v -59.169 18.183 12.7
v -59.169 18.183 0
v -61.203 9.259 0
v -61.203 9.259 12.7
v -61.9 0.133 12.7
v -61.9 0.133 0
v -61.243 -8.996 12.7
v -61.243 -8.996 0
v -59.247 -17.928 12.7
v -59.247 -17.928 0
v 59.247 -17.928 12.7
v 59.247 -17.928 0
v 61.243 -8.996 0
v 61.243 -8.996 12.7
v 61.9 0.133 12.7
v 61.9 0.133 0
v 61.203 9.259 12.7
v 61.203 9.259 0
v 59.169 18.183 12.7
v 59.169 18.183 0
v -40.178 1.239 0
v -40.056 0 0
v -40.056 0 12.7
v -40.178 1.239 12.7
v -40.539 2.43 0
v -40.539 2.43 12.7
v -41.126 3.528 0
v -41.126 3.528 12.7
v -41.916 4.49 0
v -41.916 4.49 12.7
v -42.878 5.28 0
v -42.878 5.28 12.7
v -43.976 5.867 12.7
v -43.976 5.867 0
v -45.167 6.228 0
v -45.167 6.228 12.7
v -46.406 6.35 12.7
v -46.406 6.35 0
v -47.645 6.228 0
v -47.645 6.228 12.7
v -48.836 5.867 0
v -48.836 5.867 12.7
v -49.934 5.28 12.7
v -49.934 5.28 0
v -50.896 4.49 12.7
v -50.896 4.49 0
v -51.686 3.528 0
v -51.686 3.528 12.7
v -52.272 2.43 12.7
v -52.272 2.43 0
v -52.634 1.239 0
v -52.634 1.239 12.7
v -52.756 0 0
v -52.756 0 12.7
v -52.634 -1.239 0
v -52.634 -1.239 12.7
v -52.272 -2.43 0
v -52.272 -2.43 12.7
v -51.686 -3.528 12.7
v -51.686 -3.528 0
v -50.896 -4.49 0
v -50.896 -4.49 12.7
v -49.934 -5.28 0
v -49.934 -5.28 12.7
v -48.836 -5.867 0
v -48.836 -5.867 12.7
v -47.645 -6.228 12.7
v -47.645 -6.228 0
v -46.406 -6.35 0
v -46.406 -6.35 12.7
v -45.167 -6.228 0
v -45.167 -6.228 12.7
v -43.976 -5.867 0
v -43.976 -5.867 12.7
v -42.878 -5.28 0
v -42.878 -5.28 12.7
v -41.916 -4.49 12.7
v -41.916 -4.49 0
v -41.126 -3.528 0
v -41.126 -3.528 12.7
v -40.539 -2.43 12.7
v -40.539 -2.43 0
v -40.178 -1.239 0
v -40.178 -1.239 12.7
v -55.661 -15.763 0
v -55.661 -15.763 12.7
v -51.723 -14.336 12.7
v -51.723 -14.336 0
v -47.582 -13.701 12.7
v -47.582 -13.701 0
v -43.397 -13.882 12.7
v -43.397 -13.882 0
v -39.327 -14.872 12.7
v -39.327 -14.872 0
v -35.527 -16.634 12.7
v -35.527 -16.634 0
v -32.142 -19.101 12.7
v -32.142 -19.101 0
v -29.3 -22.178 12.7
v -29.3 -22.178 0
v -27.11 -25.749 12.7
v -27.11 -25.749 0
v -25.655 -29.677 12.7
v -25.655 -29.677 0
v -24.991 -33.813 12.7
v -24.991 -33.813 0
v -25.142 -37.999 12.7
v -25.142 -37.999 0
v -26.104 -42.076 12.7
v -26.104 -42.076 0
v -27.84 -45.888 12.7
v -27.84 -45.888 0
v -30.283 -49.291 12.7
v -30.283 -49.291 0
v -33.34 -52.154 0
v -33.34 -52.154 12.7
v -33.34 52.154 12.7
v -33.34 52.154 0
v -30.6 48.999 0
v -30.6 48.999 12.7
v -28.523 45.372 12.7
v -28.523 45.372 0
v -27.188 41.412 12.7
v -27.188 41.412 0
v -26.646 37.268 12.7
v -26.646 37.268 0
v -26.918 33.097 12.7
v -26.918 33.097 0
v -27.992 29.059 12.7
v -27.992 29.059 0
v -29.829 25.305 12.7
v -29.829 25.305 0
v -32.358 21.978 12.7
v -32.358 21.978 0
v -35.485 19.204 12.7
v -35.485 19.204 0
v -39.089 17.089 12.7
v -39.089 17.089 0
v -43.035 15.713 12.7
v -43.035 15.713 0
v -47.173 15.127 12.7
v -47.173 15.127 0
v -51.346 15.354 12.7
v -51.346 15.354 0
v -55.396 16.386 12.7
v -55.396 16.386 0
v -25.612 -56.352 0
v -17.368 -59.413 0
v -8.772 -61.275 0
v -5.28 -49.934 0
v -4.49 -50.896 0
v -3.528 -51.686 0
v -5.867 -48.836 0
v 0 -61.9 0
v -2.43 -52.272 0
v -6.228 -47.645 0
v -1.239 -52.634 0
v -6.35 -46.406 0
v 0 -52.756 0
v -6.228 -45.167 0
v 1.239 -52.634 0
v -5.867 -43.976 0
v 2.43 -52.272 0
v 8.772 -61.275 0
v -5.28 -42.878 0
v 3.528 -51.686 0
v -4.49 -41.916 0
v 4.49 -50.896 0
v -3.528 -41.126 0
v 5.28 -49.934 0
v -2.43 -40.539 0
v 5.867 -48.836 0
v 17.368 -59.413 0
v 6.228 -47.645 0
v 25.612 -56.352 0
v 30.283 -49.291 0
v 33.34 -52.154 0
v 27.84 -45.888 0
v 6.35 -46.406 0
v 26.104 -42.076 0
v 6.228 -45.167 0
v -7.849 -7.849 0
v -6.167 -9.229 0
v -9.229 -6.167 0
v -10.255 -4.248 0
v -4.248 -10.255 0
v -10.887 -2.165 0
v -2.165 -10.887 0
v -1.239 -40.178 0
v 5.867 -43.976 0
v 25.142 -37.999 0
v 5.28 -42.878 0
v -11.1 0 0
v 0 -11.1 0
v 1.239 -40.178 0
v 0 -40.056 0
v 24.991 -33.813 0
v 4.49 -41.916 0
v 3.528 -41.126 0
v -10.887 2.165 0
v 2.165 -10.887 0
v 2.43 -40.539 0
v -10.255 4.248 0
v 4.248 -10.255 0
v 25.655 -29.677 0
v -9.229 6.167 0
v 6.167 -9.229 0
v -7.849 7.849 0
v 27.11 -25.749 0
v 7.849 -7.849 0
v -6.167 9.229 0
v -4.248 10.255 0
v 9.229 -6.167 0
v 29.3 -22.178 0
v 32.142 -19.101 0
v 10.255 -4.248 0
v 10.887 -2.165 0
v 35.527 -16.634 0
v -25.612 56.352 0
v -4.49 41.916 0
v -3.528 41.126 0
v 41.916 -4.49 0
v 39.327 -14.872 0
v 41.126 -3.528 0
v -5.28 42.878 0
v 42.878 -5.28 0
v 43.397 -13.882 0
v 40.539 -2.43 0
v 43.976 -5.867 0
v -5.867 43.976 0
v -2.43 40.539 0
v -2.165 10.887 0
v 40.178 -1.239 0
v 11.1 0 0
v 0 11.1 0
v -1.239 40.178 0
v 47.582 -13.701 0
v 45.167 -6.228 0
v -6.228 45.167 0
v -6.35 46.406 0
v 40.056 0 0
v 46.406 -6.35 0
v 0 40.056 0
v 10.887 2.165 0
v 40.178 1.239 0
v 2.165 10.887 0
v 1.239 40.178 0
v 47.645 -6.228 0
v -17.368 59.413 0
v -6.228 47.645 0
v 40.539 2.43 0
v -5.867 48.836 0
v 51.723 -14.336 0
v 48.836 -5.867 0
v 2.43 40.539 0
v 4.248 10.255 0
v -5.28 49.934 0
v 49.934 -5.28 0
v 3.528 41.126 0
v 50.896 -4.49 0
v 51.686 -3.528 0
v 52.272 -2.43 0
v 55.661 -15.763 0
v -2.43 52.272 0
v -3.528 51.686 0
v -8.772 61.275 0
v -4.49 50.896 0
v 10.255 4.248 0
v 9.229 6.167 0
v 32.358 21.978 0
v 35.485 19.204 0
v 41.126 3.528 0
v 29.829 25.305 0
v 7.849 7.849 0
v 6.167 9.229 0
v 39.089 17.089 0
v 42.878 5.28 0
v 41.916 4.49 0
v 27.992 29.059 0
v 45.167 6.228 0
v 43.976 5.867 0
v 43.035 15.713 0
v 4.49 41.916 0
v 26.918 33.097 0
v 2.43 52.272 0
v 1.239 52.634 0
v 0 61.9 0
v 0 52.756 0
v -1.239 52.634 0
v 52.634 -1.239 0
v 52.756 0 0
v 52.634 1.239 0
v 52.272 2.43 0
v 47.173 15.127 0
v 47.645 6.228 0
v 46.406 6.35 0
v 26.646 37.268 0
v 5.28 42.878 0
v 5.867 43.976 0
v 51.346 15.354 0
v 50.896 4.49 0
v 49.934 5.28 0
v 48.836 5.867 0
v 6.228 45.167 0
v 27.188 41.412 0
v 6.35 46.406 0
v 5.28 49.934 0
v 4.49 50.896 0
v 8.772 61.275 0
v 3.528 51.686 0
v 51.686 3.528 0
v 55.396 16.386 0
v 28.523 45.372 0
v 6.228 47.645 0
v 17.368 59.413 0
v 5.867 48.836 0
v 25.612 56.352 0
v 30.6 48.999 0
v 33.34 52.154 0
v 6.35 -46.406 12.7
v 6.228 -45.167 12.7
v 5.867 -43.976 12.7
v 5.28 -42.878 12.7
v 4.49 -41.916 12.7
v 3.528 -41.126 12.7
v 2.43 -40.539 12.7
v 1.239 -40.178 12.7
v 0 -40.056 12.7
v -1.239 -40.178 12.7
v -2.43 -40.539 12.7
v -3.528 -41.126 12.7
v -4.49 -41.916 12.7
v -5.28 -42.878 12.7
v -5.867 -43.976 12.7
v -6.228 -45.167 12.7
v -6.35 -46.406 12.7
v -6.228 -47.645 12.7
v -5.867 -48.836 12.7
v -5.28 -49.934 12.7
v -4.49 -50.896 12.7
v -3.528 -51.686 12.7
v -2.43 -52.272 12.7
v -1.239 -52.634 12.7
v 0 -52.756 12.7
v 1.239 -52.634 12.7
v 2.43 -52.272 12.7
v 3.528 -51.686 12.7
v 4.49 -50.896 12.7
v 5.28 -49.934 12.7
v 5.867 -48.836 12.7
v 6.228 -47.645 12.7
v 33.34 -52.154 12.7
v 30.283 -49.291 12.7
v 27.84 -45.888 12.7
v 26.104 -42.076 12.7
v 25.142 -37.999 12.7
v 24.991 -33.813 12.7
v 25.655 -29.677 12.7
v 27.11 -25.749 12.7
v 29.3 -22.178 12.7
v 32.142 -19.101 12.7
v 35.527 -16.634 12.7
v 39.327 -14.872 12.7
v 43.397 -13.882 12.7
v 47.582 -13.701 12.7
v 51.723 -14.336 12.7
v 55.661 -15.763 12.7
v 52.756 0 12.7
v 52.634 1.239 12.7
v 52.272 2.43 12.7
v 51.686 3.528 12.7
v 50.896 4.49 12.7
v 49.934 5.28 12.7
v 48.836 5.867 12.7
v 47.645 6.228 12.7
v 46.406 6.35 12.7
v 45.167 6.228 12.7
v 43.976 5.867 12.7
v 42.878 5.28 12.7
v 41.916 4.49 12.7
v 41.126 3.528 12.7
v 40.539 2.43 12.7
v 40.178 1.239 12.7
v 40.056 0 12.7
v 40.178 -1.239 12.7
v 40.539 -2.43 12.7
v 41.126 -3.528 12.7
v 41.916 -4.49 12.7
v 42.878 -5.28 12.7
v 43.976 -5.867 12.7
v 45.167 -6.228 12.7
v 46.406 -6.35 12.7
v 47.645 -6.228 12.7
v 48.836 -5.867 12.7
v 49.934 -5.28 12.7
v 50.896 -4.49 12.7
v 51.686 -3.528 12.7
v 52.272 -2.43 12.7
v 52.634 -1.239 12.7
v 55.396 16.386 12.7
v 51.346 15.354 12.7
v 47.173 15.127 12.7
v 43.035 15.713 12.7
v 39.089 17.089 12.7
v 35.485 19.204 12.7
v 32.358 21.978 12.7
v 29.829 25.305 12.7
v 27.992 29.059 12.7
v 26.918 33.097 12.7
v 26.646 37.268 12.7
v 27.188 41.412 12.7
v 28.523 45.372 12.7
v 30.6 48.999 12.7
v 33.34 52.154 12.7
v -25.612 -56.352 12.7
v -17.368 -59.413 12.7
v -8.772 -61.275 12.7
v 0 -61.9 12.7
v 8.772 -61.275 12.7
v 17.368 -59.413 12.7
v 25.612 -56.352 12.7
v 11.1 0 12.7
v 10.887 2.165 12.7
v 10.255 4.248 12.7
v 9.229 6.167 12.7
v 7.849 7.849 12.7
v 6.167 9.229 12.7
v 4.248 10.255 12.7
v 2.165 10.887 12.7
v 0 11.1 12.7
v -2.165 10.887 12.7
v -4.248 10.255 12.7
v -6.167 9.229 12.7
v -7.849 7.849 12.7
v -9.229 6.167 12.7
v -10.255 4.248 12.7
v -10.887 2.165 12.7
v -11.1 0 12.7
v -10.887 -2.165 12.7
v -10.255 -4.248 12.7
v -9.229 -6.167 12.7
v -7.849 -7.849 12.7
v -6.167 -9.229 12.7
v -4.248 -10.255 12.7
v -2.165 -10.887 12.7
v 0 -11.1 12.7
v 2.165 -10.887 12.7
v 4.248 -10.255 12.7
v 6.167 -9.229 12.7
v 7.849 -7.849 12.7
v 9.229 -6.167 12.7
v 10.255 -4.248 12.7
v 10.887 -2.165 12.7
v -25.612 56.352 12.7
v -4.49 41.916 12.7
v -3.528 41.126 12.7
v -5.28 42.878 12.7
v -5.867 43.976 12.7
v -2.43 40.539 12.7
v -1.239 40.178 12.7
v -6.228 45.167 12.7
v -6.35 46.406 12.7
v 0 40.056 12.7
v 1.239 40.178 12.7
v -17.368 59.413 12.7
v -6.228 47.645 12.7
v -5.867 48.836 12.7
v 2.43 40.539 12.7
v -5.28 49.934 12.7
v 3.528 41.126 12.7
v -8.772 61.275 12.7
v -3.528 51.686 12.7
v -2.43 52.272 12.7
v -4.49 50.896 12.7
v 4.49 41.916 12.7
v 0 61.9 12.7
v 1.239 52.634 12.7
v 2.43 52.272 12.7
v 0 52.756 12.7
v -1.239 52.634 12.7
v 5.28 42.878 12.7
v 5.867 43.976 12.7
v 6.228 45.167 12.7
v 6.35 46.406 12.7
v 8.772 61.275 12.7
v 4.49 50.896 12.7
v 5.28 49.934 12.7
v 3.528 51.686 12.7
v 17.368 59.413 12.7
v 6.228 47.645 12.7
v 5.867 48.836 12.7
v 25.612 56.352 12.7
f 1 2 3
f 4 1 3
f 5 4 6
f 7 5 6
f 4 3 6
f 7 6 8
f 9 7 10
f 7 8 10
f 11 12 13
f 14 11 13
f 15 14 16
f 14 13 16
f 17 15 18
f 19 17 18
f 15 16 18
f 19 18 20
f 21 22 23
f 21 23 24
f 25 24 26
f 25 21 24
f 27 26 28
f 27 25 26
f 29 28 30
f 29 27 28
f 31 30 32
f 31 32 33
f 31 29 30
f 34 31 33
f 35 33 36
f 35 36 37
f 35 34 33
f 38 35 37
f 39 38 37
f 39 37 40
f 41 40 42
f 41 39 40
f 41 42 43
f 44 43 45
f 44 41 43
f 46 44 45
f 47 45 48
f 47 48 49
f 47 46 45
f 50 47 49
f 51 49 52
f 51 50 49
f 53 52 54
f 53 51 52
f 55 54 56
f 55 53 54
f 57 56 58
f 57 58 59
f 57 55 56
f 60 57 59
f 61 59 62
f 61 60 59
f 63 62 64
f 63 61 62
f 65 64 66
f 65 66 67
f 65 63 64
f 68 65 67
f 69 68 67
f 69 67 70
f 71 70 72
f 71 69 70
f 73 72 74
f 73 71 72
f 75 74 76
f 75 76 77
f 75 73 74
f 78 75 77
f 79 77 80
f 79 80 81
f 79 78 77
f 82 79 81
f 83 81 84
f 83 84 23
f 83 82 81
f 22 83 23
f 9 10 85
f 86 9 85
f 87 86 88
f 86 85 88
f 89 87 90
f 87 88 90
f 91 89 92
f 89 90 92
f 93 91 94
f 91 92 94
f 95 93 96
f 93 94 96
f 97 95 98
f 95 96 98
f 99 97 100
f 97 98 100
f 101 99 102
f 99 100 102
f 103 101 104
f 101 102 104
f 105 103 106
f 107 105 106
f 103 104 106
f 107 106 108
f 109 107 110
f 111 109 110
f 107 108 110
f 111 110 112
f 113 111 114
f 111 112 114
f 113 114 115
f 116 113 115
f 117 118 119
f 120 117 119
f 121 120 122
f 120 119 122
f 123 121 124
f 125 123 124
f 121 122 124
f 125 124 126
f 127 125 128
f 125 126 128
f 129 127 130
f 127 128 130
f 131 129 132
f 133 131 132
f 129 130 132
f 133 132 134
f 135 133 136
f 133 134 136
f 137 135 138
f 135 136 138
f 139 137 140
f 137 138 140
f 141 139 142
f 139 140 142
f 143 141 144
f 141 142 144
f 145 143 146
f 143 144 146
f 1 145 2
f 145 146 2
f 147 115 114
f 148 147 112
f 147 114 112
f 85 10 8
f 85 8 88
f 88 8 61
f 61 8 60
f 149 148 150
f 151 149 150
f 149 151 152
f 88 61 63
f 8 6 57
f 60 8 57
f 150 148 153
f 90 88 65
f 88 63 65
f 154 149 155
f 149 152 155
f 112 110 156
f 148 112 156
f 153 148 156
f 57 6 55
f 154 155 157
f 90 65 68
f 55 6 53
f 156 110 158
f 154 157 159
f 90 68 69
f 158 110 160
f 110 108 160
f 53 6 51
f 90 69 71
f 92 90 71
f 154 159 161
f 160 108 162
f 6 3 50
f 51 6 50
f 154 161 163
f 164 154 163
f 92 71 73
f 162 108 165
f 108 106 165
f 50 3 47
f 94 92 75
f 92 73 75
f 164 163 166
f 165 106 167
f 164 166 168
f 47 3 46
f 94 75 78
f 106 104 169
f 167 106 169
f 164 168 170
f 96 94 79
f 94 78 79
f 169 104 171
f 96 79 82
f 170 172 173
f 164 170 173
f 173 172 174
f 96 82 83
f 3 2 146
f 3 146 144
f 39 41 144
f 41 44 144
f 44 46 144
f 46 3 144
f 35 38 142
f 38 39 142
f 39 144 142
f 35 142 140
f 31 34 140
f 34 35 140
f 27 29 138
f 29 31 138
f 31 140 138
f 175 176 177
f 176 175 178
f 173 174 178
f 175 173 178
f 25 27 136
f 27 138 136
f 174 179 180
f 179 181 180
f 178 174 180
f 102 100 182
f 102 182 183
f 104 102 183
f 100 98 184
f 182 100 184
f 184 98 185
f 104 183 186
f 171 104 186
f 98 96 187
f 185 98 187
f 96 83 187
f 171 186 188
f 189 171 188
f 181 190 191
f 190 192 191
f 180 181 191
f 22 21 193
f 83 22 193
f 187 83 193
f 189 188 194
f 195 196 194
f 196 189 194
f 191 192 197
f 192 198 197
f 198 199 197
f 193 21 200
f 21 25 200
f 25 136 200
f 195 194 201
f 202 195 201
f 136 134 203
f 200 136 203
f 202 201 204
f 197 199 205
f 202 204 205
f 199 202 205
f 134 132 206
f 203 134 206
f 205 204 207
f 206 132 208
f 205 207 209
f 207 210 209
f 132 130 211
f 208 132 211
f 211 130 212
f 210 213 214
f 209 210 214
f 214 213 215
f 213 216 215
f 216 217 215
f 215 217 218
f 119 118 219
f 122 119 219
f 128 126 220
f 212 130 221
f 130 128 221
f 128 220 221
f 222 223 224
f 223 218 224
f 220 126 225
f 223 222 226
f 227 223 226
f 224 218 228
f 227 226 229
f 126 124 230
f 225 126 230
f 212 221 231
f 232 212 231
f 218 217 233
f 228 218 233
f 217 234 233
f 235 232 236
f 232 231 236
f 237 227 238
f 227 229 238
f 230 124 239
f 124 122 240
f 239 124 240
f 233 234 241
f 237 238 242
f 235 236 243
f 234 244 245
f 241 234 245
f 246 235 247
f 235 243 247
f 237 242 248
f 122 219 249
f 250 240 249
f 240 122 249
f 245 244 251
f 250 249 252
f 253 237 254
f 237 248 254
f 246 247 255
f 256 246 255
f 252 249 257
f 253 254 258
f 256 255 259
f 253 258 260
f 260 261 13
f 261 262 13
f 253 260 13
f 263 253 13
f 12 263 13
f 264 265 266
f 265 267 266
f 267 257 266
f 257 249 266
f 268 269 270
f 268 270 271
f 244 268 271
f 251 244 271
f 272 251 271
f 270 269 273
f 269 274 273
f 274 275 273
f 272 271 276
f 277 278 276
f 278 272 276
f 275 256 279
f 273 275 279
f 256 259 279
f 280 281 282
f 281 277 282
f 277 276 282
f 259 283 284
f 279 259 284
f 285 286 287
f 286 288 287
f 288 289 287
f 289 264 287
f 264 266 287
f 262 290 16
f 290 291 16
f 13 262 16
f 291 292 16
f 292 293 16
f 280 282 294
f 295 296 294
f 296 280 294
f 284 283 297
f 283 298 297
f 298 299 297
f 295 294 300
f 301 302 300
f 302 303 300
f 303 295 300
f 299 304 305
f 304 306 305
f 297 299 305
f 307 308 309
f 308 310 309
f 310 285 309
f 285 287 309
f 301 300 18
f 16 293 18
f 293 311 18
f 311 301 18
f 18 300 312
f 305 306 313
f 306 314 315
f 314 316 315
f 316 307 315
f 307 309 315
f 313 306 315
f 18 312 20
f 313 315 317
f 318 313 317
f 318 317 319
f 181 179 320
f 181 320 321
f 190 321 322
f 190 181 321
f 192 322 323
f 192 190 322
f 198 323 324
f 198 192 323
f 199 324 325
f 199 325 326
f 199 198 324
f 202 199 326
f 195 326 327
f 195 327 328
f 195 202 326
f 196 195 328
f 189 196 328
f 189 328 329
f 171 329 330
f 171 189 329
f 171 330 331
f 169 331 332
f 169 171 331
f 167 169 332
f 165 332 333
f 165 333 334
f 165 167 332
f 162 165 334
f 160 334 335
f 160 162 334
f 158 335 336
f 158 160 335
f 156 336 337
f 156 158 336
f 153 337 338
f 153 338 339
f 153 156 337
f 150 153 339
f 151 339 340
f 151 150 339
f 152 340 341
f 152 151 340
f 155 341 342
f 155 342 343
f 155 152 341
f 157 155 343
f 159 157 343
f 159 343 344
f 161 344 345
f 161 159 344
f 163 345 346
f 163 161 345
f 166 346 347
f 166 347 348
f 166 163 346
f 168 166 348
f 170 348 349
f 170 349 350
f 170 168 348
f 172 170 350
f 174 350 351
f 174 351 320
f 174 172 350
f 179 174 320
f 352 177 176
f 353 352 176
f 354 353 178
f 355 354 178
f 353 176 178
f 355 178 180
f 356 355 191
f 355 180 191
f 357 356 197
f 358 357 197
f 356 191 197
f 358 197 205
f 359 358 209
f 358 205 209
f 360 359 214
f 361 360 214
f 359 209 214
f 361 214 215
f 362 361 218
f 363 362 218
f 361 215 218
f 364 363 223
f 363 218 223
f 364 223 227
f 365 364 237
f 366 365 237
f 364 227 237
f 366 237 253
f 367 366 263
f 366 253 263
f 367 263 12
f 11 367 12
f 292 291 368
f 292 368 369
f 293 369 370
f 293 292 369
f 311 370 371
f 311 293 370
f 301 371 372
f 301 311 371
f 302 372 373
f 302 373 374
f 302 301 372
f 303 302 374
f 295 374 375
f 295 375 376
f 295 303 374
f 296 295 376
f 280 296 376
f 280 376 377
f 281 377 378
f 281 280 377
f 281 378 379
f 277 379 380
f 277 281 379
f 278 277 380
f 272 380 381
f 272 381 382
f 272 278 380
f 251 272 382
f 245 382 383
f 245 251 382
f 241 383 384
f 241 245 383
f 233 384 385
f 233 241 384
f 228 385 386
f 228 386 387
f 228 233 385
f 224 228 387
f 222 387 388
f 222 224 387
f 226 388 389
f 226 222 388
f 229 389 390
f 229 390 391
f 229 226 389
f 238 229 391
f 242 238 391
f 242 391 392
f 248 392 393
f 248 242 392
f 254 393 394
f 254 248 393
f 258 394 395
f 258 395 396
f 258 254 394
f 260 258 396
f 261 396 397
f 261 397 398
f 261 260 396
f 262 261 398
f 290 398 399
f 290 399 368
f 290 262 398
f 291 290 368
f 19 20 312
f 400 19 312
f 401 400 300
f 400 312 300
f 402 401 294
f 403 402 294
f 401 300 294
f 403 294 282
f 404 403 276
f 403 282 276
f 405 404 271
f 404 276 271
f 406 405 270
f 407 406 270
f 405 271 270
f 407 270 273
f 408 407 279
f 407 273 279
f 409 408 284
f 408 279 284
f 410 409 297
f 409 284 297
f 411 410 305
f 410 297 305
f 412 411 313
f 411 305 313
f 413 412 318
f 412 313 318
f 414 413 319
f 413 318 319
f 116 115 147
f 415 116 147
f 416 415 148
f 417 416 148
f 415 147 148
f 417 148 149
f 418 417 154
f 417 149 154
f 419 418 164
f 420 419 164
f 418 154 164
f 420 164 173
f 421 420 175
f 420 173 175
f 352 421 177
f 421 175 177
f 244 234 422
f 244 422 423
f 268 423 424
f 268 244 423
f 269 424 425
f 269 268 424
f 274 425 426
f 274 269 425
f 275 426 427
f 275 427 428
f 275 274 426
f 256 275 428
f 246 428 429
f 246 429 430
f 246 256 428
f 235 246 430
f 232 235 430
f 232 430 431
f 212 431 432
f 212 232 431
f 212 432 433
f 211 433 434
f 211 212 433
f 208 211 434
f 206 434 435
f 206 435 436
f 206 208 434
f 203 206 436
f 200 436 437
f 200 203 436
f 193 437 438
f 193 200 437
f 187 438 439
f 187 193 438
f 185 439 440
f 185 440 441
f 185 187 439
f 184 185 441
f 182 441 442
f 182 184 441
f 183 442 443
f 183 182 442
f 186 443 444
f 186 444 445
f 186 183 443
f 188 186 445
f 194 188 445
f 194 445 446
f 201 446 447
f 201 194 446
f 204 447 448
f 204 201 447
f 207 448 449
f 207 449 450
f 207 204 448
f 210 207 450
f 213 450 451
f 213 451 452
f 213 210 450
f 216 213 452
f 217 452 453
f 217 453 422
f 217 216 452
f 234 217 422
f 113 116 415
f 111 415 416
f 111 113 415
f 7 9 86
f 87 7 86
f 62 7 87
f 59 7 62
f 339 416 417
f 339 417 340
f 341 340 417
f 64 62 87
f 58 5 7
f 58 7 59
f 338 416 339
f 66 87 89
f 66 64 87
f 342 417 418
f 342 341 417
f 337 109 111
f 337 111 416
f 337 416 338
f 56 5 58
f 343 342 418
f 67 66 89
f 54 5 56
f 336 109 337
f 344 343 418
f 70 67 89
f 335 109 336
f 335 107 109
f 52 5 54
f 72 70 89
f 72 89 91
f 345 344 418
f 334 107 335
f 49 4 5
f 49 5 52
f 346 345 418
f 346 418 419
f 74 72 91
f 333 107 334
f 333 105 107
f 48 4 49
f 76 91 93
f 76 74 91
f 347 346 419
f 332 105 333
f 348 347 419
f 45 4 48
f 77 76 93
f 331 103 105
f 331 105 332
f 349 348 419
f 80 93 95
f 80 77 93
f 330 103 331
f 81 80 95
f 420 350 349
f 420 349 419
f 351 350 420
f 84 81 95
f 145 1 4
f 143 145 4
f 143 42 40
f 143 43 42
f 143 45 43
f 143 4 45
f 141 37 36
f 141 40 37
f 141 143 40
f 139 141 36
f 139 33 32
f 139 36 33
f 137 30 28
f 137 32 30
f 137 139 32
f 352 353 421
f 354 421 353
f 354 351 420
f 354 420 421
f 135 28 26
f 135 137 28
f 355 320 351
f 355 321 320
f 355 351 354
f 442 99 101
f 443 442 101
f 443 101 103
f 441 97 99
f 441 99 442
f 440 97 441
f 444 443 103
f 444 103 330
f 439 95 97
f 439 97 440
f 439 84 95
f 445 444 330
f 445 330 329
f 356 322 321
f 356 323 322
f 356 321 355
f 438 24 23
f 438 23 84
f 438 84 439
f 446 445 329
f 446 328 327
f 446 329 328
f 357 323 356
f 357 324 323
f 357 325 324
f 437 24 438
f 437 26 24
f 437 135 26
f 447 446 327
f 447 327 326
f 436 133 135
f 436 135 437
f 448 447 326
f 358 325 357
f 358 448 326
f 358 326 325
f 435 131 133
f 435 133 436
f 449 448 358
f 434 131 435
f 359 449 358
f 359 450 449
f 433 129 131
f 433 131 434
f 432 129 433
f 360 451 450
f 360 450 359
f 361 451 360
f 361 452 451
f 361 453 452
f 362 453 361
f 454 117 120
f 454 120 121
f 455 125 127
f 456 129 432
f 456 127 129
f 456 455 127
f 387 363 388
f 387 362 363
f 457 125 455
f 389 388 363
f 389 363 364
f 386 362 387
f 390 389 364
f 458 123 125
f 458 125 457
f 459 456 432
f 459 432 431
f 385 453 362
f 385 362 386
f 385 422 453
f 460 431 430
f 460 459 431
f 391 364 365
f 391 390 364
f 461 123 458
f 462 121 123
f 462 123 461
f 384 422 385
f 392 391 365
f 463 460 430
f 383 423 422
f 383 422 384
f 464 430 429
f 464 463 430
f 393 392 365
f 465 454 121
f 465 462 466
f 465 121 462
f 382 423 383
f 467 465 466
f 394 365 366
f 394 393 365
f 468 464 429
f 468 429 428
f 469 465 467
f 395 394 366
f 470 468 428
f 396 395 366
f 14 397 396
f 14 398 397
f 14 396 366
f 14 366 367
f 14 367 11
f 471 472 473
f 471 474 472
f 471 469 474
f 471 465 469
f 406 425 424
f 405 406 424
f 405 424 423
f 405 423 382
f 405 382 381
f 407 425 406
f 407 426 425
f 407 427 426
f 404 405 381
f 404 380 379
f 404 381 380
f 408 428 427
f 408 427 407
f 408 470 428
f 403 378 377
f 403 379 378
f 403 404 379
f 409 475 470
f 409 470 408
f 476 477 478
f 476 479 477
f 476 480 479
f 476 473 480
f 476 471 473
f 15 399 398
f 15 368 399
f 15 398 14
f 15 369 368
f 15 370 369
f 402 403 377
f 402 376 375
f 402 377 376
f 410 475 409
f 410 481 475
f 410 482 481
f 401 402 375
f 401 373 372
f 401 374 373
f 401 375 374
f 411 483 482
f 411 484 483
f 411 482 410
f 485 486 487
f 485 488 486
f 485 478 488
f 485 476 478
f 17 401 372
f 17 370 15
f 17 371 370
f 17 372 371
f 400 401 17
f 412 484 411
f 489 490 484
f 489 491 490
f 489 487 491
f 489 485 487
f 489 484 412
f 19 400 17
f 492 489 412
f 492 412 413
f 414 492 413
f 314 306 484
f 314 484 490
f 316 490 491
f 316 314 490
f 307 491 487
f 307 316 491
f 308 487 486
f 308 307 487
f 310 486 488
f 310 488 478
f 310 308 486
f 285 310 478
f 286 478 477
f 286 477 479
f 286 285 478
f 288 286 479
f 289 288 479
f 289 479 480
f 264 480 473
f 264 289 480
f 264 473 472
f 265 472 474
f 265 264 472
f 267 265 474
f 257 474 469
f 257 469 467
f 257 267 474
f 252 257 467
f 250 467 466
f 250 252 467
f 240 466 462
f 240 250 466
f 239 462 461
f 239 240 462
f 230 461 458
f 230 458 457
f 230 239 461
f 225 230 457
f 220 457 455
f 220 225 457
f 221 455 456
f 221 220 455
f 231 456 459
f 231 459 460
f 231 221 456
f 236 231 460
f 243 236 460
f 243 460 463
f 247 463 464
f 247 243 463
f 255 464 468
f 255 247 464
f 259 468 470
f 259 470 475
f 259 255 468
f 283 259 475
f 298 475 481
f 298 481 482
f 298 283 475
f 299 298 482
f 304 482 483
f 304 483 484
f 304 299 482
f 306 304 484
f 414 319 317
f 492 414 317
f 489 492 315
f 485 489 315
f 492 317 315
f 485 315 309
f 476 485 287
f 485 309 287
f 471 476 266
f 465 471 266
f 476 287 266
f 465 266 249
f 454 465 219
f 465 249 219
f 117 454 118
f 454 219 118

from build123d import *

# Parameters (mm, degrees)
F1_R     = 6.35
F1_R_2   = 11.0998
F2_DEPTH = 12.7


with BuildPart() as f2:
    # F1 (on face) → F2 (new body)
    with BuildSketch(Plane.XY):
        with BuildLine():
            ThreePointArc((33.339887, 52.153976), (0, 61.8998), (-33.339887, 52.153976))
            ThreePointArc((-33.339887, 52.153976), (-31.01255, 23.579573), (-59.169025, 18.18273))
            ThreePointArc((-59.169025, 18.18273), (-61.899657, 0.132973), (-59.246599, -17.92835))
            ThreePointArc((-59.246599, -17.92835), (-29.299818, -22.178176), (-33.339887, -52.153976))
            ThreePointArc((-33.339887, -52.153976), (0, -61.8998), (33.339887, -52.153976))
            ThreePointArc((33.339887, -52.153976), (29.299818, -22.178176), (59.246599, -17.92835))
            ThreePointArc((59.246599, -17.92835), (61.899657, 0.132973), (59.169025, 18.18273))
            ThreePointArc((59.169025, 18.18273), (31.01255, 23.579573), (33.339887, 52.153976))
        make_face()
        with Locations((-46.4058, 0)):
            Circle(F1_R, mode=Mode.SUBTRACT)
        with Locations((0, -46.4058)):
            Circle(F1_R, mode=Mode.SUBTRACT)
        Circle(F1_R_2, mode=Mode.SUBTRACT)
        with Locations((46.4058, 0)):
            Circle(F1_R, mode=Mode.SUBTRACT)
        with Locations((0, 46.4058)):
            Circle(F1_R, mode=Mode.SUBTRACT)
    extrude(amount=F2_DEPTH)


solid = f2.part
